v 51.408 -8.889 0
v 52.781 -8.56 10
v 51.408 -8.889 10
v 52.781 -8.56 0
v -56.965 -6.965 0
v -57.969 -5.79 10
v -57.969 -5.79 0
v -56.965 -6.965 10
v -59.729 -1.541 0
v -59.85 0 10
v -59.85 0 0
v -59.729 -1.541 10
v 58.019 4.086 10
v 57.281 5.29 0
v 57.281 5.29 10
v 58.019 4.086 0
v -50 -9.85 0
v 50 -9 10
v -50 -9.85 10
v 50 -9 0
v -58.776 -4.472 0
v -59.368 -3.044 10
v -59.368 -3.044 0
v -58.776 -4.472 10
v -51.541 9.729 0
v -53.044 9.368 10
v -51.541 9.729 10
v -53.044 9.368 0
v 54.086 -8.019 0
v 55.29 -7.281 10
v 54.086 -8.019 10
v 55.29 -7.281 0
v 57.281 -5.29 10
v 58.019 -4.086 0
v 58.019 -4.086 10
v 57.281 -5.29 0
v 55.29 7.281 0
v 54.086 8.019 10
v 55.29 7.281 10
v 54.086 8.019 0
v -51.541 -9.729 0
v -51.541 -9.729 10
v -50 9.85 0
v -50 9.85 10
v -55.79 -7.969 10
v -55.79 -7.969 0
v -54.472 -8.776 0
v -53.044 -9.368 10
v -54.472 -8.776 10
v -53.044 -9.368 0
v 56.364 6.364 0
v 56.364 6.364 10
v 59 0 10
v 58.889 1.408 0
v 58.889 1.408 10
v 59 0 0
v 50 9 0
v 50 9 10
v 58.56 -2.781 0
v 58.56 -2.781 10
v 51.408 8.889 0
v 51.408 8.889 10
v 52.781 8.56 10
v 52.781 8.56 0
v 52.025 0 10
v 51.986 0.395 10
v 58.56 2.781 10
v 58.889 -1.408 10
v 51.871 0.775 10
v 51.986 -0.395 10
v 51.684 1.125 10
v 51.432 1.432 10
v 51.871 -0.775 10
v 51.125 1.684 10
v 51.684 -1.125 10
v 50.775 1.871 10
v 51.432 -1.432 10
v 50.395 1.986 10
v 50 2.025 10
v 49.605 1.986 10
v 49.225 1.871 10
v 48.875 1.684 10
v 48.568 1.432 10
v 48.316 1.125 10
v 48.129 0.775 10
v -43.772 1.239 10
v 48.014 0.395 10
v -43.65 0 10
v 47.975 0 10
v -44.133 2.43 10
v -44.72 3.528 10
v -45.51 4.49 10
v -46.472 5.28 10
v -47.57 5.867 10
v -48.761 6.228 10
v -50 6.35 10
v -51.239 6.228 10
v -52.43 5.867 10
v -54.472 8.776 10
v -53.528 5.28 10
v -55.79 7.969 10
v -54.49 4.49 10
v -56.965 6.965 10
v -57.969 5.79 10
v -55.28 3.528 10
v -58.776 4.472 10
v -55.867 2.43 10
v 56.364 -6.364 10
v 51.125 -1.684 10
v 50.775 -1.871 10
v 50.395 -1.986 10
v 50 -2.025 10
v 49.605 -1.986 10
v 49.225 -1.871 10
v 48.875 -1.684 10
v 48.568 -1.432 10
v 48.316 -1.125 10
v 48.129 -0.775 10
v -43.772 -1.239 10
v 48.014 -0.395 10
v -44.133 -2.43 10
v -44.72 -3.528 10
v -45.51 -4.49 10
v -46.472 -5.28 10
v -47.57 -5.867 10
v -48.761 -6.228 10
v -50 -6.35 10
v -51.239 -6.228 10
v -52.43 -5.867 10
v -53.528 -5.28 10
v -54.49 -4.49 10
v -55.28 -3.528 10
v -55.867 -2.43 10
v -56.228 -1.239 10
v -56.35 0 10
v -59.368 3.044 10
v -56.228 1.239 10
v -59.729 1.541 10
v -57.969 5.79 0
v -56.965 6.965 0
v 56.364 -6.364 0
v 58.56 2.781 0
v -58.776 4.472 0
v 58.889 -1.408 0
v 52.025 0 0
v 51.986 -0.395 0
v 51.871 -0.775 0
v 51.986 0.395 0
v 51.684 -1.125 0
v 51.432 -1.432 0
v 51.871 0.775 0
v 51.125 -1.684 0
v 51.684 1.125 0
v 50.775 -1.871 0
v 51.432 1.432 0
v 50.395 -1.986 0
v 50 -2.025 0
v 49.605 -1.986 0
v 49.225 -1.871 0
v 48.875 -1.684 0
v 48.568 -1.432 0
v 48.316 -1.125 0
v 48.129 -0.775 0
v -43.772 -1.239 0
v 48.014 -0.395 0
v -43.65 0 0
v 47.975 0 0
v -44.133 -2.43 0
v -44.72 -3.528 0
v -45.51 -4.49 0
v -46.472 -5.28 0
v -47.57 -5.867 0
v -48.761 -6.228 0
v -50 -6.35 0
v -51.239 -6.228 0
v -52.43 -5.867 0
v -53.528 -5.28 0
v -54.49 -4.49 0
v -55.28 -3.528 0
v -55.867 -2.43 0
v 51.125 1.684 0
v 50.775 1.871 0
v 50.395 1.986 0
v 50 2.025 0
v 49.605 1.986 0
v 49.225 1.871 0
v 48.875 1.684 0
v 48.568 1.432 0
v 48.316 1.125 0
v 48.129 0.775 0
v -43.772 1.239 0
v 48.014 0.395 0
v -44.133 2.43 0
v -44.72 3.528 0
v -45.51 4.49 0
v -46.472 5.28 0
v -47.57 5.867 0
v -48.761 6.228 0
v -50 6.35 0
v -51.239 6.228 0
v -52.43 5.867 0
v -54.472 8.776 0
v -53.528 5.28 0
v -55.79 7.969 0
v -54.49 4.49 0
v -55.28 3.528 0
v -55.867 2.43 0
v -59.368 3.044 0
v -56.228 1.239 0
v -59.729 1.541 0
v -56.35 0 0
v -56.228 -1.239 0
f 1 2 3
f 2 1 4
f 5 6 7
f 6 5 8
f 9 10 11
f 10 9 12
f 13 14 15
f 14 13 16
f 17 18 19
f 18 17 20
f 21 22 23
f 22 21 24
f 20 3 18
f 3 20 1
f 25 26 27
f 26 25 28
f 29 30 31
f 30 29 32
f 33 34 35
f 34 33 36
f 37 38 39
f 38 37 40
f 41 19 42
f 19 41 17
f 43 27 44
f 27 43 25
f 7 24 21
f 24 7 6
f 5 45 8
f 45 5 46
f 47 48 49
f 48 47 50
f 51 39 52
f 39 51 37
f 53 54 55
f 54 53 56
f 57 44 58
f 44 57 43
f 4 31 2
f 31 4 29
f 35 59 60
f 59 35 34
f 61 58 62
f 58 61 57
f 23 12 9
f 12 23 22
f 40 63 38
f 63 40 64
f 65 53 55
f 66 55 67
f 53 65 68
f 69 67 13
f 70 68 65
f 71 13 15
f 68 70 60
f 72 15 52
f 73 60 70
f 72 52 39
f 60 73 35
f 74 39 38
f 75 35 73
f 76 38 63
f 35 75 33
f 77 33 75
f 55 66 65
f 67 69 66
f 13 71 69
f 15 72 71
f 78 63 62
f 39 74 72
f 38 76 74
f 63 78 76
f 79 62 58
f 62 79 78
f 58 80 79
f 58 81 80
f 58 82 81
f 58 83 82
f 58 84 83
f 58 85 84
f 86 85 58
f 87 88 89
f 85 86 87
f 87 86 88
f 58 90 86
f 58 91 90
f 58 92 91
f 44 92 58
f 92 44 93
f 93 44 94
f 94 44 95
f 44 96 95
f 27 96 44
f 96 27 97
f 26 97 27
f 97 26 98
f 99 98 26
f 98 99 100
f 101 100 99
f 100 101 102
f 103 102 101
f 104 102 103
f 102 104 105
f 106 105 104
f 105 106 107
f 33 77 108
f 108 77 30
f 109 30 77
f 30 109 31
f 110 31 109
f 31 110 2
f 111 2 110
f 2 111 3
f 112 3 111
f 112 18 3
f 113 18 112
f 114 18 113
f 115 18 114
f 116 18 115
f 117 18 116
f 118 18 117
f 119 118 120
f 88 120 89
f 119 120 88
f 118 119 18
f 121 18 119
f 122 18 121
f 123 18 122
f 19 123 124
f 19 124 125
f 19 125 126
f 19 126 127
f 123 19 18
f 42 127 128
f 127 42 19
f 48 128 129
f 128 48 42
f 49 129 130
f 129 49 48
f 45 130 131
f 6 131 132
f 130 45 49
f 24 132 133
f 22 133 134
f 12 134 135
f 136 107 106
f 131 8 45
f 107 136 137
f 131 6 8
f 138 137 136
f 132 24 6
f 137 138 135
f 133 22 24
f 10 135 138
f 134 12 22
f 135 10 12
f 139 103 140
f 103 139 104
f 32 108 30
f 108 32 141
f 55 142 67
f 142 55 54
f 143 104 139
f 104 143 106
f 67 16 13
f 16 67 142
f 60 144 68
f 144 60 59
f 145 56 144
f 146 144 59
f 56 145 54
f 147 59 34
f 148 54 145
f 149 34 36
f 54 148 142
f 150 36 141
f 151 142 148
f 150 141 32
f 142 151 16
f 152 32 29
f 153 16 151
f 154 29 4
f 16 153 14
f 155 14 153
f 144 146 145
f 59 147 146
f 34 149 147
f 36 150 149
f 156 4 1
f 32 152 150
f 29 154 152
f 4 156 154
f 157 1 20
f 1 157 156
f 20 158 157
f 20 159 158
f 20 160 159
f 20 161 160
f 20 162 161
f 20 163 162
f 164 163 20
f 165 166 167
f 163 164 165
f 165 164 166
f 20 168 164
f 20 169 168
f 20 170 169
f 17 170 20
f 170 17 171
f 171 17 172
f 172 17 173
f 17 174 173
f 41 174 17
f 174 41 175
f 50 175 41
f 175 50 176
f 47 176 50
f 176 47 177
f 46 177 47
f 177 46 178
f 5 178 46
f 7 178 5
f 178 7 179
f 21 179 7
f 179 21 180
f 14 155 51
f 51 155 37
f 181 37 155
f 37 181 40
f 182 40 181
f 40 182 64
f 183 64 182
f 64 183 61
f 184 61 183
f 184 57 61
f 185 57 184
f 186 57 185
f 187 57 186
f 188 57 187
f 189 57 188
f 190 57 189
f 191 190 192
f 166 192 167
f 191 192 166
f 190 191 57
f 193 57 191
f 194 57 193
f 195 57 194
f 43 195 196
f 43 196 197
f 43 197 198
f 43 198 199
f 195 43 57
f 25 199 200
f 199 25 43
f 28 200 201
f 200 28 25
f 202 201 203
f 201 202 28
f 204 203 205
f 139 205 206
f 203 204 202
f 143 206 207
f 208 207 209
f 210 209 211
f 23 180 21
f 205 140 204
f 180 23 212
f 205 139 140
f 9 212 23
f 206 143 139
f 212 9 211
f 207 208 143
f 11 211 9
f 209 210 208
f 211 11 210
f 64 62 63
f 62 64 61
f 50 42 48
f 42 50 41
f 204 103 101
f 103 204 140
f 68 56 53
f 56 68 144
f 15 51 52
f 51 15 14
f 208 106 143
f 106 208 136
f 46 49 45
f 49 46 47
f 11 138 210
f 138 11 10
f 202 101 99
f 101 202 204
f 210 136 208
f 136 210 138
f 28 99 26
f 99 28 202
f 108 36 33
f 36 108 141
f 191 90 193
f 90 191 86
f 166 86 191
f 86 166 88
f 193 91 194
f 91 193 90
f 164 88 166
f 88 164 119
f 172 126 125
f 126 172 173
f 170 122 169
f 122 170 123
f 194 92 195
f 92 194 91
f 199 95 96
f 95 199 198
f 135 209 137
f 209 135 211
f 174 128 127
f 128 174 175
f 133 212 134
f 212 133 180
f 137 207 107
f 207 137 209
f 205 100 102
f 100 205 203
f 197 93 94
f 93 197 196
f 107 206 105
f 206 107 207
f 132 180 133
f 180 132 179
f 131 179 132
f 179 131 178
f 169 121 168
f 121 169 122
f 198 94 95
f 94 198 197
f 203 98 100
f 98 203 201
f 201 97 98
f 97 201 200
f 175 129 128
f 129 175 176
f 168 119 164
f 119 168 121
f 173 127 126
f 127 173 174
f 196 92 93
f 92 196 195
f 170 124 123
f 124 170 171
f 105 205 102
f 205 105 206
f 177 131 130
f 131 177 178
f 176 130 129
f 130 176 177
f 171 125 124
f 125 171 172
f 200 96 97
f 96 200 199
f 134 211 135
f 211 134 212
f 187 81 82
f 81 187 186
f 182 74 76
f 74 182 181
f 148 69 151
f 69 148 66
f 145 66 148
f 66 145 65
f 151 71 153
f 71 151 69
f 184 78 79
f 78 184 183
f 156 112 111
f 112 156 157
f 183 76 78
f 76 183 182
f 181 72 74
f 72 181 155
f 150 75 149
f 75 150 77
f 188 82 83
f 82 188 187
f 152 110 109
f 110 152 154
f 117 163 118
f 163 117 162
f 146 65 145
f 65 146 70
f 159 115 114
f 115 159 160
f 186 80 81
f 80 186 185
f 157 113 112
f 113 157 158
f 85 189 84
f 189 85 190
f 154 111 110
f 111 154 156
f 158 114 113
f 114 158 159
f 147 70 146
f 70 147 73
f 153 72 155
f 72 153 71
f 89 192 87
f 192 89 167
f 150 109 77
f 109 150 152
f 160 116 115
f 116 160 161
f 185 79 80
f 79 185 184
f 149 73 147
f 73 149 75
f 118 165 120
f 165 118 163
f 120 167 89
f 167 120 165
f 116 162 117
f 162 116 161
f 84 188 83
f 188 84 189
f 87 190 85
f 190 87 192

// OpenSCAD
$fn = 32;

// ----------------------------------------------------------------------
// Lever: 100 mm between the bosses, 10 mm thick, smooth outline
// ----------------------------------------------------------------------

// --- parameters (mm) ---
lever_l = 100;            // distance between the boss centres
boss_a = 19.7;            // first boss diameter
boss_b = 18;              // second boss diameter
bore_a = 12.7;            // first bore
bore_b = 4.05;            // second bore
lever_t = 10;             // lever thickness

lever_profile = [[-59.85, 0], [-59.729, -1.541], [-59.368, -3.044], [-58.776, -4.472], [-57.969, -5.79], [-56.965, -6.965], [-55.79, -7.969], [-54.472, -8.776], [-53.044, -9.368], [-51.541, -9.729], [-50, -9.85], [50, -9], [51.408, -8.889], [52.781, -8.56], [54.086, -8.019], [55.29, -7.281], [56.364, -6.364], [57.281, -5.29], [58.019, -4.086], [58.56, -2.781], [58.889, -1.408], [59, 0], [58.889, 1.408], [58.56, 2.781], [58.019, 4.086], [57.281, 5.29], [56.364, 6.364], [55.29, 7.281], [54.086, 8.019], [52.781, 8.56], [51.408, 8.889], [50, 9], [-50, 9.85], [-51.541, 9.729], [-53.044, 9.368], [-54.472, 8.776], [-55.79, 7.969], [-56.965, 6.965], [-57.969, 5.79], [-58.776, 4.472], [-59.368, 3.044], [-59.729, 1.541]];

difference() {
  linear_extrude(height = lever_t) polygon(lever_profile);
  translate([-50, 0, -2.5]) cylinder(h = lever_t + 5, d = bore_a);
  translate([50, 0, -2.5]) cylinder(h = lever_t + 5, d = bore_b);
}
